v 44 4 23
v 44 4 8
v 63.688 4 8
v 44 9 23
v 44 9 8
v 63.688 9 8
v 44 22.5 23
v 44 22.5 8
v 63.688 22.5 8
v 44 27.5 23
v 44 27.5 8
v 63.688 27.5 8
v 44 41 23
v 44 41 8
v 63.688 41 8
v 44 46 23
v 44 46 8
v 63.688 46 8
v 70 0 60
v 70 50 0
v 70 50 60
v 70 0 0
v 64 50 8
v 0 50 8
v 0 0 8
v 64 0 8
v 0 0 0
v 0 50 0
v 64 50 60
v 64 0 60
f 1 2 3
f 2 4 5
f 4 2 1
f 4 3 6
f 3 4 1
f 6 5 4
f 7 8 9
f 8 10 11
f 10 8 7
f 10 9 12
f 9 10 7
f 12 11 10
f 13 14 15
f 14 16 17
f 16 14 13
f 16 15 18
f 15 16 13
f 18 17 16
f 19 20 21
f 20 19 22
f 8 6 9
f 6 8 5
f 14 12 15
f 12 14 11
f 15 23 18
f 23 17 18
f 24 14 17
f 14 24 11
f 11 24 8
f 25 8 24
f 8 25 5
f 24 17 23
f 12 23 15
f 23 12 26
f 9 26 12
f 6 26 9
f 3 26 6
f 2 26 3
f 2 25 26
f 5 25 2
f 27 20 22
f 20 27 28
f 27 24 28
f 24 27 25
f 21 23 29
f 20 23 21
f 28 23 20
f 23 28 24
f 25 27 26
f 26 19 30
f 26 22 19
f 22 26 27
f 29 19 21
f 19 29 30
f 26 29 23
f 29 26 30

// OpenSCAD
$fn = 32;

// ----------------------------------------------------------------------
// Rib bracket: 3-gusset L bracket
// ----------------------------------------------------------------------

// --- parameters (mm) ---
base_l = 70;              // foot length, X
base_w = 50;              // foot width, Y
base_t = 8;               // foot thickness
plate_t = 6;              // upright plate thickness
plate_h = 60;             // overall height
gus_l = 20;               // gusset leg along the foot
gus_h = 16;               // gusset height
gus_t = 5;                // gusset thickness
gus_edge = 4;             // gusset margin from the foot edge
n_gus = 3;                // gusset count

gus_pitch = (base_w - 2 * gus_edge - gus_t) / (n_gus - 1);  // gusset pitch

union() {
  cube([base_l, base_w, base_t]);
  translate([base_l - plate_t, 0, base_t - 1])
    cube([plate_t, base_w, plate_h - base_t + 1]);
  for (i = [0 : n_gus - 1])
    translate([base_l - plate_t - gus_l, gus_edge + i * gus_pitch, base_t - 1])
      rotate([-90, 0, 0])
        linear_extrude(height = gus_t)
          polygon(points = [[0, 0], [gus_l + 1, 0], [0, -gus_h]]);
}
